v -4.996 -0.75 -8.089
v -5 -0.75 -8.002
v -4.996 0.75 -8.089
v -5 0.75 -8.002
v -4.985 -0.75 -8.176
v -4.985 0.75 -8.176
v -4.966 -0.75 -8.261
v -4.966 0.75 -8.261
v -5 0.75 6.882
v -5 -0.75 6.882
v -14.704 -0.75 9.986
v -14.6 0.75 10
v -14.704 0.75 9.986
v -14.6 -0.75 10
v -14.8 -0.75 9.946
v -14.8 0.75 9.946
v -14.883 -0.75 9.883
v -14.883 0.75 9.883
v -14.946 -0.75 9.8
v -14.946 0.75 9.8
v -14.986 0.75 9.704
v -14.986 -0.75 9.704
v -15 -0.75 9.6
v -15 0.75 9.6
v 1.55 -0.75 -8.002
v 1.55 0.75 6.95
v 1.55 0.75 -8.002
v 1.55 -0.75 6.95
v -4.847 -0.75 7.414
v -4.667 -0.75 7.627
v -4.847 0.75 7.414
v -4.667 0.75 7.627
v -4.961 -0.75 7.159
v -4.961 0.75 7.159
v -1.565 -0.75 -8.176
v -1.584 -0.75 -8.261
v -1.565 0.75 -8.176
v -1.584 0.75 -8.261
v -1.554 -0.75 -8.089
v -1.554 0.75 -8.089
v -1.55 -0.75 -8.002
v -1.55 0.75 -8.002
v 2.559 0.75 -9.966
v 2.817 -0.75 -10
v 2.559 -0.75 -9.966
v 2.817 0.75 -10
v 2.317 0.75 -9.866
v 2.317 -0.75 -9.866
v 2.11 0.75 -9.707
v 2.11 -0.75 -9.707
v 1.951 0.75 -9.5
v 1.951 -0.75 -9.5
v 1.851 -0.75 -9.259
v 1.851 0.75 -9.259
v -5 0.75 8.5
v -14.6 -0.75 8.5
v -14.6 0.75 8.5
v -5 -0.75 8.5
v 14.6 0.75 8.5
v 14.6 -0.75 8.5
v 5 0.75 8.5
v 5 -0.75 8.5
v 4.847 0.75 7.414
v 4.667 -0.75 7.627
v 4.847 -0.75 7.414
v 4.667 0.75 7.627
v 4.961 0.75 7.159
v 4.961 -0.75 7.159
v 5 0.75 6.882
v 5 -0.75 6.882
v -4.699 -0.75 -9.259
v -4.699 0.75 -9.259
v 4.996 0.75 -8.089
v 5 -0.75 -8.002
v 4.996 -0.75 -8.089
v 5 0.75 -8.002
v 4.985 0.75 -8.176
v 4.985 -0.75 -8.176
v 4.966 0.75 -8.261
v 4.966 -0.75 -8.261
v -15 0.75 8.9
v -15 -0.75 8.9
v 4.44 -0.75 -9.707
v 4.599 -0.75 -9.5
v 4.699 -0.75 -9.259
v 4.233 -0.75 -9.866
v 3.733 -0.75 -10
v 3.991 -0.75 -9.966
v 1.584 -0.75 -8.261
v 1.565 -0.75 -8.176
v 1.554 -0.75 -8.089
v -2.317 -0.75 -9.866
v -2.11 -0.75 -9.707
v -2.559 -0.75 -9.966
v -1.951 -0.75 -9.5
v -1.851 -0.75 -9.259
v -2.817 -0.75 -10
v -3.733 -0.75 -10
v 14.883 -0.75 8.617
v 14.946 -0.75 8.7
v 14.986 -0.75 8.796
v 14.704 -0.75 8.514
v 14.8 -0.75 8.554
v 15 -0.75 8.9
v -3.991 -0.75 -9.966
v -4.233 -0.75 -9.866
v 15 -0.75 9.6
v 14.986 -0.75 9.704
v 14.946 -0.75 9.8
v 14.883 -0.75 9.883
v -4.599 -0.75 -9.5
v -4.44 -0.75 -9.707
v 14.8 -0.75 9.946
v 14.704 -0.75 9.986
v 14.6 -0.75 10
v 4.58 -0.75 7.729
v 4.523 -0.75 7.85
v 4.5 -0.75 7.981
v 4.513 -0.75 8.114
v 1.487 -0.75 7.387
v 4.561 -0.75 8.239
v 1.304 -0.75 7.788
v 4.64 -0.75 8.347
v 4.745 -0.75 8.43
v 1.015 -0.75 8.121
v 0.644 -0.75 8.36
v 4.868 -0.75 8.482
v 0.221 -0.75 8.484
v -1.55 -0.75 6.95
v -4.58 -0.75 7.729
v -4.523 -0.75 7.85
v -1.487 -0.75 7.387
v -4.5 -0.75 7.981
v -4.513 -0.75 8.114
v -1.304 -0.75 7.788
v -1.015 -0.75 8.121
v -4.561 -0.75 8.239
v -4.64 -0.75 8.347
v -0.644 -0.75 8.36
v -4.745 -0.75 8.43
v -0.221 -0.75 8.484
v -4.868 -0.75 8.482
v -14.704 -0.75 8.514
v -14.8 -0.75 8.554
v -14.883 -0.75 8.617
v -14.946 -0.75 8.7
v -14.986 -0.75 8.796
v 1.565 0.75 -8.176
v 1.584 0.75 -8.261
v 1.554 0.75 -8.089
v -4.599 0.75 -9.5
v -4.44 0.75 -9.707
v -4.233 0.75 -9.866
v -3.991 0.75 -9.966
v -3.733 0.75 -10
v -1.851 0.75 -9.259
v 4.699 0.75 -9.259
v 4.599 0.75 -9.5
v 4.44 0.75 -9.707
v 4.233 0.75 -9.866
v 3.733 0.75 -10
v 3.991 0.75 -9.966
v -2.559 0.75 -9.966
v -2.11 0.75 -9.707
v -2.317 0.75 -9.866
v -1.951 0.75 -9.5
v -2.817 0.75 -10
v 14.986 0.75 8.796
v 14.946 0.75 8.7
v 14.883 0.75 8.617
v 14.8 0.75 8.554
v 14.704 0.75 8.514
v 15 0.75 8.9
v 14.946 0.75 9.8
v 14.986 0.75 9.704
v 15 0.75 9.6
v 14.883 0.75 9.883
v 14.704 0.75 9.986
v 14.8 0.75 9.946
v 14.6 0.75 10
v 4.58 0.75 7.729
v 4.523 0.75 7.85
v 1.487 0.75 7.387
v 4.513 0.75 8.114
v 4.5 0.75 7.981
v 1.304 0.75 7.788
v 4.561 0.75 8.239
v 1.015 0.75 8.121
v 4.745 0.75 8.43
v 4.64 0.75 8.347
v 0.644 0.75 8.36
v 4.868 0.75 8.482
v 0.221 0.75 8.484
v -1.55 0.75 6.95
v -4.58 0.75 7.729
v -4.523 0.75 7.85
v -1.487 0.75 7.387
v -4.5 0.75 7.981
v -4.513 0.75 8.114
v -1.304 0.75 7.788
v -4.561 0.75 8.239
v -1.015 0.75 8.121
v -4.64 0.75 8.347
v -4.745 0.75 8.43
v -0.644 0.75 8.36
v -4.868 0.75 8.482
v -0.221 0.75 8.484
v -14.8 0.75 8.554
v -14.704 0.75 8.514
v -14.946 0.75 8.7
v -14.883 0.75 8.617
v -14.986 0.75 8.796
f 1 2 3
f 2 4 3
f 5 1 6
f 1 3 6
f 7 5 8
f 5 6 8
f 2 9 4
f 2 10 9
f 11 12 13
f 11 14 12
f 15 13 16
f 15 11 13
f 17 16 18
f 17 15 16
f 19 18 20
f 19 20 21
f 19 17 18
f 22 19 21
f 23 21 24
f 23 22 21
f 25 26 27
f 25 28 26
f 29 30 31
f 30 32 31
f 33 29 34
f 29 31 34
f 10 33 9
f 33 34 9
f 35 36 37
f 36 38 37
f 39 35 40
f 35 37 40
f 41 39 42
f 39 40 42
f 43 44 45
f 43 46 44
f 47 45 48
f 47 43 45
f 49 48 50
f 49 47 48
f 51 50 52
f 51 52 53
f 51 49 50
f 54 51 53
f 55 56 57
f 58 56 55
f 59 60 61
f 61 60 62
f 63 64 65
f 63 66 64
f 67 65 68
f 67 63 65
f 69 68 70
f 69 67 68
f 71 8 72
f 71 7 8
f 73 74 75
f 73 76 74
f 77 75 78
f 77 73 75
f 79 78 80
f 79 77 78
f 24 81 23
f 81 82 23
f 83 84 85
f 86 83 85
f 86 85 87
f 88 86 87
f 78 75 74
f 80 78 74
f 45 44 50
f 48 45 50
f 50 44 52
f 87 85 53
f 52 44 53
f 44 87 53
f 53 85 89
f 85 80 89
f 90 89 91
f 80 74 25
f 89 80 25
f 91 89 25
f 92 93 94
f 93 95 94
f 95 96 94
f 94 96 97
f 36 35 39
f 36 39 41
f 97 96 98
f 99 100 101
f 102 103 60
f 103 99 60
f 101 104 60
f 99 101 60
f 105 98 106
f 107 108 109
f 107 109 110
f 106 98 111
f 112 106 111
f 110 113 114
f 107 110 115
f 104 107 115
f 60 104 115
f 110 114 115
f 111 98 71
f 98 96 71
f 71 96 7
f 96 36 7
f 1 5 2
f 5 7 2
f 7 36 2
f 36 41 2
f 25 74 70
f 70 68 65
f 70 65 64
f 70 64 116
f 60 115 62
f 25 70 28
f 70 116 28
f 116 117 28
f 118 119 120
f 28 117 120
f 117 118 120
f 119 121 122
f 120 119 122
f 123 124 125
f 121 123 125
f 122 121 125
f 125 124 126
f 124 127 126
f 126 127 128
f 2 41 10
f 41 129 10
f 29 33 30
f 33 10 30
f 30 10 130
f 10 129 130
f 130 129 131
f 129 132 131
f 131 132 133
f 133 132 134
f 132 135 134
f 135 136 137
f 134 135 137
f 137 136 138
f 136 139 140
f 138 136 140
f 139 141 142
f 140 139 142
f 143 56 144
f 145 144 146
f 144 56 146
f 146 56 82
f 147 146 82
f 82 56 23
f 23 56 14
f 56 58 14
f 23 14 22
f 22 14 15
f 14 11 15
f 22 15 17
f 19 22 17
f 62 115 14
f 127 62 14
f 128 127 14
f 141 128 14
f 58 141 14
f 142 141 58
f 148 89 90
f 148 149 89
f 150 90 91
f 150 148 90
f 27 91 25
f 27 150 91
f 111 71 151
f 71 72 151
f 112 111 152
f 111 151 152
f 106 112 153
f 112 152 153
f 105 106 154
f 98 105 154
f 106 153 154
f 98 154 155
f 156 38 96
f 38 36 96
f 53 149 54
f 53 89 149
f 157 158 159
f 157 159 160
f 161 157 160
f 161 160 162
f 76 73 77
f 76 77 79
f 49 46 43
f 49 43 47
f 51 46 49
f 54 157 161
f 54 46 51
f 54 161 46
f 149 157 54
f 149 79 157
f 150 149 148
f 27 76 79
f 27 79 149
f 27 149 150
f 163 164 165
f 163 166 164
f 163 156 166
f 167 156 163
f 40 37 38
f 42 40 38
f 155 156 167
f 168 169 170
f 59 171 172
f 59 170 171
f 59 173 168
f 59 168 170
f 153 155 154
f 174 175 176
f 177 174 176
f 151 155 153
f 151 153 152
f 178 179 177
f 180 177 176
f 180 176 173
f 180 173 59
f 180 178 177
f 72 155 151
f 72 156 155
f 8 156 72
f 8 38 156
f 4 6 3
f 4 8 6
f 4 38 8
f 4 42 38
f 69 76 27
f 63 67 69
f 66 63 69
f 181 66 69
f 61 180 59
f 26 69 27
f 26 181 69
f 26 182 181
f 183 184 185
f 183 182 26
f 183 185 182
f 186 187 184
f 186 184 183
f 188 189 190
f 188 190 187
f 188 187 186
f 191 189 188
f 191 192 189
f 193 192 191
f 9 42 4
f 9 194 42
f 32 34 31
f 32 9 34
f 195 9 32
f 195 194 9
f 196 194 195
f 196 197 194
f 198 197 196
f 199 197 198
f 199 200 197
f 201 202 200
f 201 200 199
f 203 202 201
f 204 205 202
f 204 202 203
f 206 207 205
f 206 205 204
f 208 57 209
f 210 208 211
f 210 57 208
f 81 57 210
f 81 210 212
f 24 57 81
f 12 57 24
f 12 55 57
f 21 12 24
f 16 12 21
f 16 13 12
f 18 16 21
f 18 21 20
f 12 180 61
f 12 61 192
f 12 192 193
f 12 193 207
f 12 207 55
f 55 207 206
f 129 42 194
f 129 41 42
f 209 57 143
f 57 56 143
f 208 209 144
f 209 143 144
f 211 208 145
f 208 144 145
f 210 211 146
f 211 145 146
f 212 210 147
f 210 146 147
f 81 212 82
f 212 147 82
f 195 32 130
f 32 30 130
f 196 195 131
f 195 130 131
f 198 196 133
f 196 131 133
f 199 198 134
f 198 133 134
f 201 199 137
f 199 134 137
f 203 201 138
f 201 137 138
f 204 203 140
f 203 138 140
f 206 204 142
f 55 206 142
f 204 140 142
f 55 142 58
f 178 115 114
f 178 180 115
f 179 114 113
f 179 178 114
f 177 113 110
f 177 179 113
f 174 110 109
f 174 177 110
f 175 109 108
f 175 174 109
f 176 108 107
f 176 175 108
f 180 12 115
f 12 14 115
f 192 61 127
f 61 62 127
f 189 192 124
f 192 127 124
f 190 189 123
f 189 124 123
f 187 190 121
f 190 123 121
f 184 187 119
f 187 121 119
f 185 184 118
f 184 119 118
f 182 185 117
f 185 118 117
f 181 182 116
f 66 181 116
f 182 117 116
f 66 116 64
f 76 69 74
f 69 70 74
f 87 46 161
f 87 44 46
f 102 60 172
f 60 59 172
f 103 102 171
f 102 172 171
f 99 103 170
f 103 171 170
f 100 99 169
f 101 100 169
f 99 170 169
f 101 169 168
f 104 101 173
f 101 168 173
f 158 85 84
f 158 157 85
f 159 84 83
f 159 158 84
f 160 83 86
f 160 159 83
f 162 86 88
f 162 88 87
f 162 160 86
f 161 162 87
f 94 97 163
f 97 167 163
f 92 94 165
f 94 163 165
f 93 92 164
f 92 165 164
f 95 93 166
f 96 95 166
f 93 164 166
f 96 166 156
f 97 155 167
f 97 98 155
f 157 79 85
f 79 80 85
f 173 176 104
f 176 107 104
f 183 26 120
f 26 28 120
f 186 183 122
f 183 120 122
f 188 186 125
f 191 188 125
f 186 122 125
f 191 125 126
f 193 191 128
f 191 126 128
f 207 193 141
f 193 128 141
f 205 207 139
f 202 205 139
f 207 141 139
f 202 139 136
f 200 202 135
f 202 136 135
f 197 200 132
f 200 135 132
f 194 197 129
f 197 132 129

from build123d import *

# Parameters (mm, degrees)
PAD013_DEPTH = 0.75
FILLET018_R  = 0.4
FILLET019_R  = 1


with BuildPart() as part:
    # Sketch016 → Pad013 (new body, symmetric)
    with BuildSketch(Plane.XZ):
        with BuildLine():
            Line((-15, 10), (15, 10))
            Line((15, 10), (15, 8.5))
            Line((15, 8.5), (6, 8.5))
            Line((6, 8.5), (5, 8.5))
            ThreePointArc((5, 8.5), (4.5, 8), (5, 7.5))
            Line((5, 7.5), (5, -8.133975))
            Line((5, -8.133975), (4.5, -10))
            Line((2.05, -10), (4.5, -10))
            Line((1.55, -8.133975), (2.05, -10))
            Line((1.55, 6.95), (1.55, -8.133975))
            ThreePointArc((1.55, 6.95), (0, 8.5), (-1.55, 6.95))
            Line((-1.55, -8.133975), (-1.55, 6.95))
            Line((-1.55, -8.133975), (-2.05, -10))
            Line((-4.5, -10), (-2.05, -10))
            Line((-5, -8.133975), (-4.5, -10))
            Line((-5, 7.5), (-5, -8.133975))
            ThreePointArc((-5, 7.5), (-4.5, 8), (-5, 8.5))
            Line((-6, 8.5), (-5, 8.5))
            Line((-15, 8.5), (-6, 8.5))
            Line((-15, 8.5), (-15, 10))
        make_face()
    extrude(amount=PAD013_DEPTH, both=True)

    # Fillet018
    fillet018_edges = [part.edges().sort_by_distance(p)[0] for p in [
        (-15, 0, 10),
        (-15, 0, 8.5),
        (15, 0, 10),
        (15, 0, 8.5),
    ]]
    fillet(fillet018_edges, radius=FILLET018_R)

    # Fillet019
    fillet019_edges = [part.edges().sort_by_distance(p)[0] for p in [
        (-5, 0, 7.5),
        (-5, 0, -8.133975),
        (-4.5, 0, -10),
        (-2.05, 0, -10),
        (-1.55, 0, -8.133975),
        (1.55, 0, -8.133975),
        (2.05, 0, -10),
        (4.5, 0, -10),
        (5, 0, -8.133975),
        (5, 0, 7.5),
    ]]
    fillet(fillet019_edges, radius=FILLET019_R)


solid = part.part
